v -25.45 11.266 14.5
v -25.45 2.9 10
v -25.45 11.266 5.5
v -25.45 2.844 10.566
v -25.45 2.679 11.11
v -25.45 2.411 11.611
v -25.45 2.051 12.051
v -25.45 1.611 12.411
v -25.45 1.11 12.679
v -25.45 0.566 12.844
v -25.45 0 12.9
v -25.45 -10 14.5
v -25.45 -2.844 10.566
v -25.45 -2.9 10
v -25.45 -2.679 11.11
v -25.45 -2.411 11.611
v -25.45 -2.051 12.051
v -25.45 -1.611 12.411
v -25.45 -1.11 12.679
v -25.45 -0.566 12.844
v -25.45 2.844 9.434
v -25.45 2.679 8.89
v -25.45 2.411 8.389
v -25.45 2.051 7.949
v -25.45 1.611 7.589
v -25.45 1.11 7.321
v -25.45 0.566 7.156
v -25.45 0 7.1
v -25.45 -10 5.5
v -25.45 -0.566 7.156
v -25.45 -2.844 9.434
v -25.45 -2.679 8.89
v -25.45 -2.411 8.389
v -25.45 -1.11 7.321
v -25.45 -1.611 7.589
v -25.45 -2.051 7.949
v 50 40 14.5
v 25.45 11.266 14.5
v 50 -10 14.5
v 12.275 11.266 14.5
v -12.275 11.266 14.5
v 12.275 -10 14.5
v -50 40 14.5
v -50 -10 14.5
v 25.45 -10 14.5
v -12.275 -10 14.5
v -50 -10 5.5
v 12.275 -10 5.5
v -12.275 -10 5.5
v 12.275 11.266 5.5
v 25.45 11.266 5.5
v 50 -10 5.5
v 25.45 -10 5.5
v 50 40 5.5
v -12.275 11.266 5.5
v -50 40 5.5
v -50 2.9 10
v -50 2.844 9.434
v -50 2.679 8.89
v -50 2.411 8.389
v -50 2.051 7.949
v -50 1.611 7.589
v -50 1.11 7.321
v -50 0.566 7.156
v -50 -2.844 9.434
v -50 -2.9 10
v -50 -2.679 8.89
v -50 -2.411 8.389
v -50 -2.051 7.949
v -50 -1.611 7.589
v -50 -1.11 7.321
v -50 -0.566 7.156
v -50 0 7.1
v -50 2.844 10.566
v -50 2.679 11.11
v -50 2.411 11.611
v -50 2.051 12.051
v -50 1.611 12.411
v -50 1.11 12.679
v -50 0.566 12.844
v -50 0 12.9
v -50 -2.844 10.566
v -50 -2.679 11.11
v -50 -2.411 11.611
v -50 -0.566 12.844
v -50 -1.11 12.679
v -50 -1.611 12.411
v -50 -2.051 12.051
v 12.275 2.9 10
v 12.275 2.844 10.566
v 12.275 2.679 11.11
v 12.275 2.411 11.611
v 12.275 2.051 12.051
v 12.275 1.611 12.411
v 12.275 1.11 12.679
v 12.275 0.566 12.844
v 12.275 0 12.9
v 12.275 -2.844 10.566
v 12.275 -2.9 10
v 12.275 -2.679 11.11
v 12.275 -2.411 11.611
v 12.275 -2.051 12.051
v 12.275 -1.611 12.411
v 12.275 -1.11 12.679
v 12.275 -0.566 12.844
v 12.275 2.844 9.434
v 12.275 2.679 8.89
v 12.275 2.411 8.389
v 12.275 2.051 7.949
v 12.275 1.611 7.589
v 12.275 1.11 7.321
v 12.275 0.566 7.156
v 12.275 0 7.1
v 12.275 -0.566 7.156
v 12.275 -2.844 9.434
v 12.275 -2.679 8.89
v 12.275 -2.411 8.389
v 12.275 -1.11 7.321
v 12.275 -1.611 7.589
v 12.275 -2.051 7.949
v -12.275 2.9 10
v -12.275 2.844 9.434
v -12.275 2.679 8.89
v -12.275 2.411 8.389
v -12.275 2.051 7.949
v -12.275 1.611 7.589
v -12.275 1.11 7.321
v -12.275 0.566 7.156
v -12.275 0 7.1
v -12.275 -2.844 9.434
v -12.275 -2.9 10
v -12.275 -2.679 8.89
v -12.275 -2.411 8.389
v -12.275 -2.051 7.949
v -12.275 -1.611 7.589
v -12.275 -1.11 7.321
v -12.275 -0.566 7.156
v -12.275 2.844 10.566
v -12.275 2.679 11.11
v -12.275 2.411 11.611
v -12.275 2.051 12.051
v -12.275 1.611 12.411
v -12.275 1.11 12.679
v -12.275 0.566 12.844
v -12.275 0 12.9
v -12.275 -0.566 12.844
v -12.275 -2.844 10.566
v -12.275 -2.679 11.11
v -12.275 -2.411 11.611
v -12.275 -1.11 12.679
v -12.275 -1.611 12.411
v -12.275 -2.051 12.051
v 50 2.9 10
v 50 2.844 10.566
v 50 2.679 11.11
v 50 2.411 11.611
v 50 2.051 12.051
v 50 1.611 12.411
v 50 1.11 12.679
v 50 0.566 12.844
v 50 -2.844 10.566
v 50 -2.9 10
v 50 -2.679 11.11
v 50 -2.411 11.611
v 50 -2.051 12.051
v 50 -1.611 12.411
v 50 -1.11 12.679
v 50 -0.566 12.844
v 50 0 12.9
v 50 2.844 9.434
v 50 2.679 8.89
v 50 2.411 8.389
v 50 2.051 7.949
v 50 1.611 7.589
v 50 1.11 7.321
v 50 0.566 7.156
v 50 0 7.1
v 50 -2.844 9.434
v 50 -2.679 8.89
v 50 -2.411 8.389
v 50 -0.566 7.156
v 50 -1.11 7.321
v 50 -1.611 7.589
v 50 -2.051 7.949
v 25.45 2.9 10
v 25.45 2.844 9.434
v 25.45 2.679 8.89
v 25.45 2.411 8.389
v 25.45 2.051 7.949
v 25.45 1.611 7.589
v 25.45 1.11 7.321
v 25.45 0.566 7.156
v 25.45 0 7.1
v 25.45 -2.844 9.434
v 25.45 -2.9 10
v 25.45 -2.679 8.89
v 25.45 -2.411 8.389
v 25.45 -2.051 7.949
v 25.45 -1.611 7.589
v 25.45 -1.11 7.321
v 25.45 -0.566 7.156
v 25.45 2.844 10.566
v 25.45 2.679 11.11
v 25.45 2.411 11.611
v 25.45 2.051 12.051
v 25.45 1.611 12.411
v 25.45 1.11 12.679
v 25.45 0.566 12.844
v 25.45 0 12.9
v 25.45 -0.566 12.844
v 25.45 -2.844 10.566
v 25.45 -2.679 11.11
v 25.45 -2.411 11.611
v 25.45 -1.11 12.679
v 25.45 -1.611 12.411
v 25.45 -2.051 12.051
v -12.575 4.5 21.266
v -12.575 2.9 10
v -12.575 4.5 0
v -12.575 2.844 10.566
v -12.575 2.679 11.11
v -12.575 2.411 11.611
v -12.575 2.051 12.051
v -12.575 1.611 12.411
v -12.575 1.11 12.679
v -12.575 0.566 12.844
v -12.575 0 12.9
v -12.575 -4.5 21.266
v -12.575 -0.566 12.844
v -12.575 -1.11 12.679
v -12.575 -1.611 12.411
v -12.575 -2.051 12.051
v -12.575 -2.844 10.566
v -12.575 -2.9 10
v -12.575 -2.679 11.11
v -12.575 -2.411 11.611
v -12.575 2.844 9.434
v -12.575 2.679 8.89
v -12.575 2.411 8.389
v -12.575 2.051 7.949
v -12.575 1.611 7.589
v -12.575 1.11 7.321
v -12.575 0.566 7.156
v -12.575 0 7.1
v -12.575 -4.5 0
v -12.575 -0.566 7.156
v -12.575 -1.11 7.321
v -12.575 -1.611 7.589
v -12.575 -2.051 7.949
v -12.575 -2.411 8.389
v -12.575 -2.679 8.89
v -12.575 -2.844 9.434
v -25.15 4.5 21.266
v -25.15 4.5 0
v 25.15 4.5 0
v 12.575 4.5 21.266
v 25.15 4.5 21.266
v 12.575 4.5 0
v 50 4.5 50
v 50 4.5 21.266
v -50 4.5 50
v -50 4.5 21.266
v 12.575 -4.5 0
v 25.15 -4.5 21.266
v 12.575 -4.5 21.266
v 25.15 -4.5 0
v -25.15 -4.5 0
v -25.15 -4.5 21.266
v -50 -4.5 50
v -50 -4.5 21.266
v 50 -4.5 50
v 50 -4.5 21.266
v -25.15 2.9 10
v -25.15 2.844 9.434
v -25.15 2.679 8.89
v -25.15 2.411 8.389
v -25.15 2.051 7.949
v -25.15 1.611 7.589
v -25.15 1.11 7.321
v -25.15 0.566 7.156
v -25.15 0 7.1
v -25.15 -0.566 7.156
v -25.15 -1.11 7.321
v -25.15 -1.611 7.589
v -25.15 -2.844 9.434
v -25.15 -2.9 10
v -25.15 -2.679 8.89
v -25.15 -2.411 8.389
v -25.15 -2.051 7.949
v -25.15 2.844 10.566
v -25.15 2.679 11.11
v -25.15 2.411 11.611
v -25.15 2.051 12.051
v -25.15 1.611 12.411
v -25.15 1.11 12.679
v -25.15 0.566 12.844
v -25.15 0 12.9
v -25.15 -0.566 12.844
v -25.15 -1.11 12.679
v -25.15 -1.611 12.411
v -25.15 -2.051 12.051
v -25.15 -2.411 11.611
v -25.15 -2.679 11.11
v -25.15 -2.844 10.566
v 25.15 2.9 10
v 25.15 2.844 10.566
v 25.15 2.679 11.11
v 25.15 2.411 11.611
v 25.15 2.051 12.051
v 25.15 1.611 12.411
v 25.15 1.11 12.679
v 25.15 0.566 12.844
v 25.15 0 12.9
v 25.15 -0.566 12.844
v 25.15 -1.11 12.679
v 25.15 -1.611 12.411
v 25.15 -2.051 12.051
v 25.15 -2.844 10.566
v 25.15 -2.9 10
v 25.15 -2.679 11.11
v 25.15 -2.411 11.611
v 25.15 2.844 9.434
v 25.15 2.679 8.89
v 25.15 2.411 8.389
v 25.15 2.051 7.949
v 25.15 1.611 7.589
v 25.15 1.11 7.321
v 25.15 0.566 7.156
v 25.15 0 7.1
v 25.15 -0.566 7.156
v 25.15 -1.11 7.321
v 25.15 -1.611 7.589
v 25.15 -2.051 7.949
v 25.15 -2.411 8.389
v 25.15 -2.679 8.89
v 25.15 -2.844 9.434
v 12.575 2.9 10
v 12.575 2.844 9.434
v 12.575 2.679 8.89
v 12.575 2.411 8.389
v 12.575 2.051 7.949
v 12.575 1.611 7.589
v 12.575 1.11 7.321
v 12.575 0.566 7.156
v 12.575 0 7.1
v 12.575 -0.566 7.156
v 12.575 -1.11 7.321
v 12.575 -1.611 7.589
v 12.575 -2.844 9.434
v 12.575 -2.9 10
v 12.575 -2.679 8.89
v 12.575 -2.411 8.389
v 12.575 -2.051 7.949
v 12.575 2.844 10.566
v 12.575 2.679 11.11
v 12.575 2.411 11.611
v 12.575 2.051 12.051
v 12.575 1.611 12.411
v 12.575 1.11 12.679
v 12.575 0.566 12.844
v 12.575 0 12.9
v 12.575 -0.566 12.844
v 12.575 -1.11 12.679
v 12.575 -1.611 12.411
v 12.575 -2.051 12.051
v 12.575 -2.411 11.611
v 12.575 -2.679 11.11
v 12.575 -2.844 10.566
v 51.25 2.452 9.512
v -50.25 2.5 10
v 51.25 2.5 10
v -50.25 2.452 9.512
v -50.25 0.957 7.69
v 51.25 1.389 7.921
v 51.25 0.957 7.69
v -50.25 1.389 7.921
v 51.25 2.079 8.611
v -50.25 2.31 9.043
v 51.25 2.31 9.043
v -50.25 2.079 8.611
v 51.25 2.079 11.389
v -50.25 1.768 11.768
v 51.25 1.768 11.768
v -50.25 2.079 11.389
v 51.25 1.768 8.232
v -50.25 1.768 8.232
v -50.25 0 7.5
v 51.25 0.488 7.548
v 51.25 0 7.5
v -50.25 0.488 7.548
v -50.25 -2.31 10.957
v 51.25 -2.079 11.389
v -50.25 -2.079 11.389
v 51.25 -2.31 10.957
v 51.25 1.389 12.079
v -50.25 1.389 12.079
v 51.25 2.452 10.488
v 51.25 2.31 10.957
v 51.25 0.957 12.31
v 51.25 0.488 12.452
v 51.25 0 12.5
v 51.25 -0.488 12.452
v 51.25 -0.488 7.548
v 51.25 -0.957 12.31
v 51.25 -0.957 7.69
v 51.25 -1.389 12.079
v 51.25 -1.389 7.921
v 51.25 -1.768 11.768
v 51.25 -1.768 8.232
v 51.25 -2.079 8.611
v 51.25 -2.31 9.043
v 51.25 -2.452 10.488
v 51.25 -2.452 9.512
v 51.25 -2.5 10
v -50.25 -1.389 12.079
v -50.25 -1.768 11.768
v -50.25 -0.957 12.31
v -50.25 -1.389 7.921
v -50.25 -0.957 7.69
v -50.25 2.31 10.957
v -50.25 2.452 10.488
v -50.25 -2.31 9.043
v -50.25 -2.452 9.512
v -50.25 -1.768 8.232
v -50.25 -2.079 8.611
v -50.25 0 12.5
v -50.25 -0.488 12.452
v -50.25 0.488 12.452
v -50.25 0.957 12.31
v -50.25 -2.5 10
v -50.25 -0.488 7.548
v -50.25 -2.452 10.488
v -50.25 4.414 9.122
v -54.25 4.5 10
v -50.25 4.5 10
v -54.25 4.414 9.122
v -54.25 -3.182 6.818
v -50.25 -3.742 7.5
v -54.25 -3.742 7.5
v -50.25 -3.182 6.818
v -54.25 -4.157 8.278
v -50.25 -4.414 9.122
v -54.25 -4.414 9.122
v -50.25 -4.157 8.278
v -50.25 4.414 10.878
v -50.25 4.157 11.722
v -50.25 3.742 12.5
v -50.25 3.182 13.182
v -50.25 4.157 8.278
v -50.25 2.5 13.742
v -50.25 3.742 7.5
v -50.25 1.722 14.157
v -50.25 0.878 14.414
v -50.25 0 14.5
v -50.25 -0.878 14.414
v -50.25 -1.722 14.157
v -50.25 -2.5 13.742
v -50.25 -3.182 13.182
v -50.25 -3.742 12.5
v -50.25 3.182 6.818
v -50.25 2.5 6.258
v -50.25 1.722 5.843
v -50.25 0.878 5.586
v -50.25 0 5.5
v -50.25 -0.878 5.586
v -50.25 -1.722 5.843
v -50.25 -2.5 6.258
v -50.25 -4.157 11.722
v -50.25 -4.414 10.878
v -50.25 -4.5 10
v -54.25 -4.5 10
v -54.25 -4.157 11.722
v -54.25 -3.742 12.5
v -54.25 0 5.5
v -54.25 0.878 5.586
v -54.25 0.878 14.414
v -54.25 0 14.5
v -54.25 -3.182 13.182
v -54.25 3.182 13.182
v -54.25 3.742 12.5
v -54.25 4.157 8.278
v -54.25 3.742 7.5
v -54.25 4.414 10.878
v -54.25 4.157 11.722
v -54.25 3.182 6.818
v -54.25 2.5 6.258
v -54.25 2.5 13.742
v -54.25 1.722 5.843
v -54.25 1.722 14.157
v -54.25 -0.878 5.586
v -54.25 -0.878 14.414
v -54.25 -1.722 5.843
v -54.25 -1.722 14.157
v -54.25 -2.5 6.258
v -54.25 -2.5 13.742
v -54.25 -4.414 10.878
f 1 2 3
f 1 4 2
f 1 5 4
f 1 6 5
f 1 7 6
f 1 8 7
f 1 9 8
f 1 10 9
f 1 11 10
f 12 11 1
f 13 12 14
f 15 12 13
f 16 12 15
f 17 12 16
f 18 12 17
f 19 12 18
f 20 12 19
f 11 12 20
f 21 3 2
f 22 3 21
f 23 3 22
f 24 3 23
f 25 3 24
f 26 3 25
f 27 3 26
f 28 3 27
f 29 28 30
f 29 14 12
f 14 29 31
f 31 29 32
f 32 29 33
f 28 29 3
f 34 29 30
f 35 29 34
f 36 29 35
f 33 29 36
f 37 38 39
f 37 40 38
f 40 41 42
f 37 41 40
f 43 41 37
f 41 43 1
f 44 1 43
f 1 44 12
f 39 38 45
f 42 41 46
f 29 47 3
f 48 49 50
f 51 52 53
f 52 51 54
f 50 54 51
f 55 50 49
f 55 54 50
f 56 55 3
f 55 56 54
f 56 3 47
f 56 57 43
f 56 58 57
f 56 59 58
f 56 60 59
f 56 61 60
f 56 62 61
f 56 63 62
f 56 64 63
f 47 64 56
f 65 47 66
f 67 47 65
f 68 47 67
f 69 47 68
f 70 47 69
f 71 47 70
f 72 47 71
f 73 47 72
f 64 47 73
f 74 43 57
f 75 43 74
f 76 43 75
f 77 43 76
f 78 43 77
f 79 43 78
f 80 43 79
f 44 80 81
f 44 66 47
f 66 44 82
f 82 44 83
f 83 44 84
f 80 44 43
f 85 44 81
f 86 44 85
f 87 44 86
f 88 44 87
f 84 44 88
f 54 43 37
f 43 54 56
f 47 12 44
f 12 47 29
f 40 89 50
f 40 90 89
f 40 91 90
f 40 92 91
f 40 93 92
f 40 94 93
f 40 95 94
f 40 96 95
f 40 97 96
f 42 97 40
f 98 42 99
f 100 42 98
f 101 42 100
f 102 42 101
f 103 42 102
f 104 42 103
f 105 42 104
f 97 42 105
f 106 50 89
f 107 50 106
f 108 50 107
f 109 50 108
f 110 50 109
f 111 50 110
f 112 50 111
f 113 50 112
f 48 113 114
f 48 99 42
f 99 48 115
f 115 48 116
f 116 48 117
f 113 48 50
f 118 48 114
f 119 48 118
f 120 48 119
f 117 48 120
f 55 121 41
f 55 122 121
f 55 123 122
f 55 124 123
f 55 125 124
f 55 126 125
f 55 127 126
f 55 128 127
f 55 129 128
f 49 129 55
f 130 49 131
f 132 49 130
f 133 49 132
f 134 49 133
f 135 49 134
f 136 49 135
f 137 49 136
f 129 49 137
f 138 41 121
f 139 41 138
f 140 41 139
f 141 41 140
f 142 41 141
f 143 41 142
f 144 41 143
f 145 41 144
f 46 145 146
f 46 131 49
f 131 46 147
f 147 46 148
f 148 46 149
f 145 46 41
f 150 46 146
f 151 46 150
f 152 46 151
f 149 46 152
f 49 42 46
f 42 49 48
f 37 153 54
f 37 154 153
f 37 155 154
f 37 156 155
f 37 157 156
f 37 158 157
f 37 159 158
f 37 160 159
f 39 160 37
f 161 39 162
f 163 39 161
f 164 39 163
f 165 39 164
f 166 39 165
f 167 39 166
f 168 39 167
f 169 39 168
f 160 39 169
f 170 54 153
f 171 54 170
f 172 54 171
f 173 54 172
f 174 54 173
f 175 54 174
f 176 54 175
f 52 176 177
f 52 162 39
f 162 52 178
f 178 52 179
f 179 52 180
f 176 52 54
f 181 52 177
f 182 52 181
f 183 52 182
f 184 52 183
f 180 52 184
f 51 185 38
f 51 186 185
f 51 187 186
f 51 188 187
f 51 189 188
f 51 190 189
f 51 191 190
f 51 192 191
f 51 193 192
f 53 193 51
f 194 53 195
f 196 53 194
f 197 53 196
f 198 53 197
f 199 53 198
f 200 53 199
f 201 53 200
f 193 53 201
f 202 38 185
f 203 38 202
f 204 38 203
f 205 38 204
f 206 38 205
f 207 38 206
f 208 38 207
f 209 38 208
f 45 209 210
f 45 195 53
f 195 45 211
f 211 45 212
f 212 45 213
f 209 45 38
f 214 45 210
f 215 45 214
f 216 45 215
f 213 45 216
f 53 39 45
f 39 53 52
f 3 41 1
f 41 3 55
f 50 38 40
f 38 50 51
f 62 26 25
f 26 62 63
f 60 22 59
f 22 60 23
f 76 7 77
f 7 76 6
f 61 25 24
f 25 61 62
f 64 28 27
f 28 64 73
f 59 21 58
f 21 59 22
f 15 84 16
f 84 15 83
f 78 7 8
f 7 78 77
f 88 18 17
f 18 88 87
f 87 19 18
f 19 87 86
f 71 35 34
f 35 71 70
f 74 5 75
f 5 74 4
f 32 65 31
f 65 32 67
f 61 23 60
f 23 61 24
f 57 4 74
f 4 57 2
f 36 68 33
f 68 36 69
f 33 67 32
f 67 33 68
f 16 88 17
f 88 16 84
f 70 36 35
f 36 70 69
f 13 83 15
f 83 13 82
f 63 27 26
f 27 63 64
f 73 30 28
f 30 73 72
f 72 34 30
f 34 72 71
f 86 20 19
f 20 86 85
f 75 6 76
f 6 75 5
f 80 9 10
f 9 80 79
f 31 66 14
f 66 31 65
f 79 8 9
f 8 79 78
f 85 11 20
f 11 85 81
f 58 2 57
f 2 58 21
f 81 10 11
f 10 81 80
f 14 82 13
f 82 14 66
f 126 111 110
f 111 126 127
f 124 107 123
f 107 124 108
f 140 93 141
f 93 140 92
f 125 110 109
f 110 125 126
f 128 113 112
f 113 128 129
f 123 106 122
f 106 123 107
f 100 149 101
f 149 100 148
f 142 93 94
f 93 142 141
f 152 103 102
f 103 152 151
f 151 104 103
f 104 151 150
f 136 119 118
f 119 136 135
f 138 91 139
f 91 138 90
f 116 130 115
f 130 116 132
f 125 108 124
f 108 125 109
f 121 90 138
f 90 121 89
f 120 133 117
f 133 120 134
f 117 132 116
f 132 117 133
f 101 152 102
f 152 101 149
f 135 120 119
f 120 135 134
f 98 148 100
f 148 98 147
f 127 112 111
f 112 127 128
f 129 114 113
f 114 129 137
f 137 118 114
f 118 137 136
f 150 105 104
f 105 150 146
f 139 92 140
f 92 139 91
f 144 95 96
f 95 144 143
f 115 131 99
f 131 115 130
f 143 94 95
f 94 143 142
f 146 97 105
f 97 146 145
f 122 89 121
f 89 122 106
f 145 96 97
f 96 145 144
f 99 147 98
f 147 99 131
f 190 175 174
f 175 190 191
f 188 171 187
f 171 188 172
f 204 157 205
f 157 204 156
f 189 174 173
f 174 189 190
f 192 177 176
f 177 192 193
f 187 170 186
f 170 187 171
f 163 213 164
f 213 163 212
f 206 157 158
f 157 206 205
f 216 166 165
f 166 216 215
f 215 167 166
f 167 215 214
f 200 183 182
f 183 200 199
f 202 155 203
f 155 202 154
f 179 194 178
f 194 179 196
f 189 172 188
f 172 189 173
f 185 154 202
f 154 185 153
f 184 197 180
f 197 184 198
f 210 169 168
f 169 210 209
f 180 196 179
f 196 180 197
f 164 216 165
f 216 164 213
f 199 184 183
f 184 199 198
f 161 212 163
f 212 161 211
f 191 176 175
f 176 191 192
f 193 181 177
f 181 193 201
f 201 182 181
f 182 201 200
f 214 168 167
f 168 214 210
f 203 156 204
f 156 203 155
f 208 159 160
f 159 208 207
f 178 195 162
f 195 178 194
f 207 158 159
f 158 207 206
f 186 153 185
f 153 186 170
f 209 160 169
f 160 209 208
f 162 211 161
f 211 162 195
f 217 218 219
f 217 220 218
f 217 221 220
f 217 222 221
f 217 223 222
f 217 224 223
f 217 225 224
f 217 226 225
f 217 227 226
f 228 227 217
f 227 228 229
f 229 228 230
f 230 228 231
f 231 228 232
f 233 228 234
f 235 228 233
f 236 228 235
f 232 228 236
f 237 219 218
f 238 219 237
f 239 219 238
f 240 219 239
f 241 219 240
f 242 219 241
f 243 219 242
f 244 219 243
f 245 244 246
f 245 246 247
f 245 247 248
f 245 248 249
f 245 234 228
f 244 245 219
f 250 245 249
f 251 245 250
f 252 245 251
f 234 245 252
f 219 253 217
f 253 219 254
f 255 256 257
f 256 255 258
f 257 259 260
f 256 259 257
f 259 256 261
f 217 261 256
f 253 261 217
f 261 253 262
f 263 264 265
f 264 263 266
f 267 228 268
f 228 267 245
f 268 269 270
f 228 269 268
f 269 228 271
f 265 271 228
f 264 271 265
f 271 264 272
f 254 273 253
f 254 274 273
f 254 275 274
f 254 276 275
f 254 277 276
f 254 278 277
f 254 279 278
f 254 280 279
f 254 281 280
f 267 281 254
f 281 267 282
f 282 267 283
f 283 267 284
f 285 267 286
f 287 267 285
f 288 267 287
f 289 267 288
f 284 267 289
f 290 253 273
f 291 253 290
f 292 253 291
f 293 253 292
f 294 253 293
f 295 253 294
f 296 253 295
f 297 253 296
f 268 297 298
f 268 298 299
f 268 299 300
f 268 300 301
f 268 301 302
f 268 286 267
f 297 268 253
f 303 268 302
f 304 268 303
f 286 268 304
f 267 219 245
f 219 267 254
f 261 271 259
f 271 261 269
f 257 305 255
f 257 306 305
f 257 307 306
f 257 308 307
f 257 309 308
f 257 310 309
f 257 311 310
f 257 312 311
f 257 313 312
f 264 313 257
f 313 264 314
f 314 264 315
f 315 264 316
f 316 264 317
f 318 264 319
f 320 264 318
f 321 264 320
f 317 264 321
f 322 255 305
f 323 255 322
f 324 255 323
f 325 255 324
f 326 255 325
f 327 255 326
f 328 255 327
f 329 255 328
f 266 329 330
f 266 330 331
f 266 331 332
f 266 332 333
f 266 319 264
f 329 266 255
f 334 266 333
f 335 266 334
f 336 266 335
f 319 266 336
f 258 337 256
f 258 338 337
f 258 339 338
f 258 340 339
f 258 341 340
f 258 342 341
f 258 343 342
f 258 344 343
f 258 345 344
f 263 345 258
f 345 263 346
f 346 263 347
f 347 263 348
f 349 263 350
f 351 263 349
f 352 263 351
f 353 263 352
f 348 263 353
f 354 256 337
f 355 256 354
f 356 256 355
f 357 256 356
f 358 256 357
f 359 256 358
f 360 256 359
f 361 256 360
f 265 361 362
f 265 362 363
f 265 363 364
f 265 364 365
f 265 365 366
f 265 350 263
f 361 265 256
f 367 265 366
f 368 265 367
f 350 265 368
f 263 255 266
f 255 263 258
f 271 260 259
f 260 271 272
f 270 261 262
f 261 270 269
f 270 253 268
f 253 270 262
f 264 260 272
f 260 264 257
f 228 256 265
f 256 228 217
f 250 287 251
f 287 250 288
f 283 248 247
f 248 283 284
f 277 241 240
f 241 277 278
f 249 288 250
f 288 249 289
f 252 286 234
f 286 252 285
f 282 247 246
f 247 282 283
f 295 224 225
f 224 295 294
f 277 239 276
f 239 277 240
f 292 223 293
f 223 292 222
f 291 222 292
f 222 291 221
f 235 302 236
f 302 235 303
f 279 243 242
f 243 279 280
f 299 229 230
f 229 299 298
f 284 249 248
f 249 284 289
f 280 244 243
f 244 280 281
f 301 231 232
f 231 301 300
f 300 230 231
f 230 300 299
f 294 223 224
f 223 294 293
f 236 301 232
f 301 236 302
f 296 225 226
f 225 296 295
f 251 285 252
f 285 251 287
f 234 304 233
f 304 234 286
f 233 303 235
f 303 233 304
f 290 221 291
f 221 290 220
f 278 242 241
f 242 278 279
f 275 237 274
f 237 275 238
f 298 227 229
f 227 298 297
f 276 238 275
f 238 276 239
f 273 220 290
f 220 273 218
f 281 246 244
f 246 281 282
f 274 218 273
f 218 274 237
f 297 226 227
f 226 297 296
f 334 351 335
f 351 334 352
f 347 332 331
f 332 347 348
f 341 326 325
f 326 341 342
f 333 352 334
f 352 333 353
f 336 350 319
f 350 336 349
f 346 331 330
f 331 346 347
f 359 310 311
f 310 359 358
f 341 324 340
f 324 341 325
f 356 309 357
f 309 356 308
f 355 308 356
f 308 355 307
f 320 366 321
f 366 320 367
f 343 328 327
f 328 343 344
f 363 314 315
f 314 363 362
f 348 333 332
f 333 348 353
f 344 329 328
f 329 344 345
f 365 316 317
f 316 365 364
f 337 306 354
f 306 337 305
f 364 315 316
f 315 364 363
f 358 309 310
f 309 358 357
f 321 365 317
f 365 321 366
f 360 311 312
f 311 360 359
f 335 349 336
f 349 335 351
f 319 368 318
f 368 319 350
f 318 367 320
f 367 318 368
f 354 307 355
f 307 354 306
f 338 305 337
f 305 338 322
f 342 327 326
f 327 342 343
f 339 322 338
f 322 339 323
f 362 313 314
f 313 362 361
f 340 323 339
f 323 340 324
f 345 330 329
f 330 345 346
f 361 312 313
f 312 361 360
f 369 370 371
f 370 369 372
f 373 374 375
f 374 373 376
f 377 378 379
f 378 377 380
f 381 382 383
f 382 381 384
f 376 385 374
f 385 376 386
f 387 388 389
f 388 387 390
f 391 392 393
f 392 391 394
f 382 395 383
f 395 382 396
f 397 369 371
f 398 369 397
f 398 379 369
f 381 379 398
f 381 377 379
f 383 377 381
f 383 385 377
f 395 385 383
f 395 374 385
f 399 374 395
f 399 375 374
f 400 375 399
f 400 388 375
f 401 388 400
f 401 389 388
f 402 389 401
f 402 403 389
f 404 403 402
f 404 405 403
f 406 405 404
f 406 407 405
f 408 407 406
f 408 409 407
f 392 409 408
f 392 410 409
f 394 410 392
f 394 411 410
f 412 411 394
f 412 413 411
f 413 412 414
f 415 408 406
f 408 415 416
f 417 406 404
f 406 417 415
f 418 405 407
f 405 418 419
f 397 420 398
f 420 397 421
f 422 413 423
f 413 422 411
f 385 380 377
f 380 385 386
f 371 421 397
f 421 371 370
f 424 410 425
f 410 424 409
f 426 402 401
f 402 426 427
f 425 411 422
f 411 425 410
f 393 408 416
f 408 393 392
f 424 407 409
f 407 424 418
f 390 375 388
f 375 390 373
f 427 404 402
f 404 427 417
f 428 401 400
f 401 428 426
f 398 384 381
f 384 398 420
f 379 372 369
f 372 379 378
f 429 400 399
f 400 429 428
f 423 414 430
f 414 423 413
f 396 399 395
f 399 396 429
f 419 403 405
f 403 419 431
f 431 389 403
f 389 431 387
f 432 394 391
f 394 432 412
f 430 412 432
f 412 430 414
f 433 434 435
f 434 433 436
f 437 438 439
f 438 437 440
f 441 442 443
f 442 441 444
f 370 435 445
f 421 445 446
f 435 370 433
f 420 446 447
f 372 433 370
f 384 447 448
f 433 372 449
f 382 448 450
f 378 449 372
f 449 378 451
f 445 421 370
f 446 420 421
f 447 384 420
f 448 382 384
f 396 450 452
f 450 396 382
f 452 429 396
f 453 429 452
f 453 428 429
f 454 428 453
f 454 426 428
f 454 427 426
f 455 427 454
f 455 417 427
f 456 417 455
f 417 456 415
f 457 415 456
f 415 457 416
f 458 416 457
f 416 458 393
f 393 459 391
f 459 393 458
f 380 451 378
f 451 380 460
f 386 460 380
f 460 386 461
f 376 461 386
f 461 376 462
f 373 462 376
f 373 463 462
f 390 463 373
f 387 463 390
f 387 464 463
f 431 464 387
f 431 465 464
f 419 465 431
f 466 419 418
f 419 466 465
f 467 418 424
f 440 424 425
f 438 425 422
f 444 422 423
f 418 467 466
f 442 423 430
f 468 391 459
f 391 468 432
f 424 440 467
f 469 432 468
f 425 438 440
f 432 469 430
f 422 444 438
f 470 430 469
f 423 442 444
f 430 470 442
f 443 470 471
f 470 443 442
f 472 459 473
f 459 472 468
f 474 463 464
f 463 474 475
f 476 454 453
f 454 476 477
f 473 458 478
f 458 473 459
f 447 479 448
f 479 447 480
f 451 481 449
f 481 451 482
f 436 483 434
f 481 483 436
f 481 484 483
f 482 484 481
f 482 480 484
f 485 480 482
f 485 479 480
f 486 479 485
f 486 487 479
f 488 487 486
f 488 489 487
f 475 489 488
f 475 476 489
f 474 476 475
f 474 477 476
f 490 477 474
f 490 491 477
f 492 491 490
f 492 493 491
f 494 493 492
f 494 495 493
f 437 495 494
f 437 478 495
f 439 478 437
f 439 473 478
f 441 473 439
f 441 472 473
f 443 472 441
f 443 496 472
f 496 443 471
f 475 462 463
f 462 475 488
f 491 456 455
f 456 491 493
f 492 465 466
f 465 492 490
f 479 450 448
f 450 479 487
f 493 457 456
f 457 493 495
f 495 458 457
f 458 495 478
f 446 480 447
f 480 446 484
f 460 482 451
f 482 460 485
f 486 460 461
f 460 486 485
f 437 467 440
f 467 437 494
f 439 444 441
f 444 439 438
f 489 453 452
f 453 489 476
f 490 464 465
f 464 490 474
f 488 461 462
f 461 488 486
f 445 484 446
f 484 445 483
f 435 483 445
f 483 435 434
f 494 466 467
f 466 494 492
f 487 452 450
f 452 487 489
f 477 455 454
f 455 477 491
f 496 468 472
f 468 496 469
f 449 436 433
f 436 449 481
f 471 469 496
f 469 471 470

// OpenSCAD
$fn = 32;

// ------------------------------------------------------------------------
// Butt hinge: hinge 100 mm, leaf swung 270 deg
// Every part is its own module, assembly() places every instance.
// ------------------------------------------------------------------------

// --- part 1 ---
module hinge_base() {
  difference() {
    union() {
      translate([-50, -10, -4.5]) cube([24.55, 50, 9]);
      translate([-12.275, -10, -4.5]) cube([24.55, 50, 9]);
      translate([25.45, -10, -4.5]) cube([24.55, 50, 9]);
      translate([-50, 11.266, -4.5]) cube([100, 28.734, 9]);
    }
    translate([-37.725, 0, 0]) rotate([0, 90, 0]) cylinder(h = 26.55, d = 5.8, center = true);
    translate([0, 0, 0]) rotate([0, 90, 0]) cylinder(h = 26.55, d = 5.8, center = true);
    translate([37.725, 0, 0]) rotate([0, 90, 0]) cylinder(h = 26.55, d = 5.8, center = true);
  }
}

// --- part 2 ---
module hinge_mover() {
  difference() {
    union() {
      translate([-25.15, -40, -4.5]) cube([12.575, 50, 9]);
      translate([12.575, -40, -4.5]) cube([12.575, 50, 9]);
      translate([-50, -40, -4.5]) cube([100, 28.734, 9]);
    }
    translate([-18.863, 0, 0]) rotate([0, 90, 0]) cylinder(h = 14.575, d = 5.8, center = true);
    translate([18.863, 0, 0]) rotate([0, 90, 0]) cylinder(h = 14.575, d = 5.8, center = true);
  }
}

// --- part 3 ---
module hinge_pin() {
  rotate([0, 90, 0]) cylinder(h = 102.5, d = 5, center = true);
  translate([-54.25, 0, 0]) rotate([0, 90, 0]) cylinder(h = 4, d = 9);
}

// --- assembly ---
module assembly() {
  color([0.80, 0.24, 0.20]) translate([0, 0, 10]) rotate([0, 0, 0]) hinge_base();
  color([0.20, 0.45, 0.75]) translate([0, 0, 10]) rotate([270, 0, 0]) hinge_mover();
  color([0.25, 0.62, 0.32]) translate([0, 0, 10]) rotate([0, 0, 0]) hinge_pin();
}

assembly();
